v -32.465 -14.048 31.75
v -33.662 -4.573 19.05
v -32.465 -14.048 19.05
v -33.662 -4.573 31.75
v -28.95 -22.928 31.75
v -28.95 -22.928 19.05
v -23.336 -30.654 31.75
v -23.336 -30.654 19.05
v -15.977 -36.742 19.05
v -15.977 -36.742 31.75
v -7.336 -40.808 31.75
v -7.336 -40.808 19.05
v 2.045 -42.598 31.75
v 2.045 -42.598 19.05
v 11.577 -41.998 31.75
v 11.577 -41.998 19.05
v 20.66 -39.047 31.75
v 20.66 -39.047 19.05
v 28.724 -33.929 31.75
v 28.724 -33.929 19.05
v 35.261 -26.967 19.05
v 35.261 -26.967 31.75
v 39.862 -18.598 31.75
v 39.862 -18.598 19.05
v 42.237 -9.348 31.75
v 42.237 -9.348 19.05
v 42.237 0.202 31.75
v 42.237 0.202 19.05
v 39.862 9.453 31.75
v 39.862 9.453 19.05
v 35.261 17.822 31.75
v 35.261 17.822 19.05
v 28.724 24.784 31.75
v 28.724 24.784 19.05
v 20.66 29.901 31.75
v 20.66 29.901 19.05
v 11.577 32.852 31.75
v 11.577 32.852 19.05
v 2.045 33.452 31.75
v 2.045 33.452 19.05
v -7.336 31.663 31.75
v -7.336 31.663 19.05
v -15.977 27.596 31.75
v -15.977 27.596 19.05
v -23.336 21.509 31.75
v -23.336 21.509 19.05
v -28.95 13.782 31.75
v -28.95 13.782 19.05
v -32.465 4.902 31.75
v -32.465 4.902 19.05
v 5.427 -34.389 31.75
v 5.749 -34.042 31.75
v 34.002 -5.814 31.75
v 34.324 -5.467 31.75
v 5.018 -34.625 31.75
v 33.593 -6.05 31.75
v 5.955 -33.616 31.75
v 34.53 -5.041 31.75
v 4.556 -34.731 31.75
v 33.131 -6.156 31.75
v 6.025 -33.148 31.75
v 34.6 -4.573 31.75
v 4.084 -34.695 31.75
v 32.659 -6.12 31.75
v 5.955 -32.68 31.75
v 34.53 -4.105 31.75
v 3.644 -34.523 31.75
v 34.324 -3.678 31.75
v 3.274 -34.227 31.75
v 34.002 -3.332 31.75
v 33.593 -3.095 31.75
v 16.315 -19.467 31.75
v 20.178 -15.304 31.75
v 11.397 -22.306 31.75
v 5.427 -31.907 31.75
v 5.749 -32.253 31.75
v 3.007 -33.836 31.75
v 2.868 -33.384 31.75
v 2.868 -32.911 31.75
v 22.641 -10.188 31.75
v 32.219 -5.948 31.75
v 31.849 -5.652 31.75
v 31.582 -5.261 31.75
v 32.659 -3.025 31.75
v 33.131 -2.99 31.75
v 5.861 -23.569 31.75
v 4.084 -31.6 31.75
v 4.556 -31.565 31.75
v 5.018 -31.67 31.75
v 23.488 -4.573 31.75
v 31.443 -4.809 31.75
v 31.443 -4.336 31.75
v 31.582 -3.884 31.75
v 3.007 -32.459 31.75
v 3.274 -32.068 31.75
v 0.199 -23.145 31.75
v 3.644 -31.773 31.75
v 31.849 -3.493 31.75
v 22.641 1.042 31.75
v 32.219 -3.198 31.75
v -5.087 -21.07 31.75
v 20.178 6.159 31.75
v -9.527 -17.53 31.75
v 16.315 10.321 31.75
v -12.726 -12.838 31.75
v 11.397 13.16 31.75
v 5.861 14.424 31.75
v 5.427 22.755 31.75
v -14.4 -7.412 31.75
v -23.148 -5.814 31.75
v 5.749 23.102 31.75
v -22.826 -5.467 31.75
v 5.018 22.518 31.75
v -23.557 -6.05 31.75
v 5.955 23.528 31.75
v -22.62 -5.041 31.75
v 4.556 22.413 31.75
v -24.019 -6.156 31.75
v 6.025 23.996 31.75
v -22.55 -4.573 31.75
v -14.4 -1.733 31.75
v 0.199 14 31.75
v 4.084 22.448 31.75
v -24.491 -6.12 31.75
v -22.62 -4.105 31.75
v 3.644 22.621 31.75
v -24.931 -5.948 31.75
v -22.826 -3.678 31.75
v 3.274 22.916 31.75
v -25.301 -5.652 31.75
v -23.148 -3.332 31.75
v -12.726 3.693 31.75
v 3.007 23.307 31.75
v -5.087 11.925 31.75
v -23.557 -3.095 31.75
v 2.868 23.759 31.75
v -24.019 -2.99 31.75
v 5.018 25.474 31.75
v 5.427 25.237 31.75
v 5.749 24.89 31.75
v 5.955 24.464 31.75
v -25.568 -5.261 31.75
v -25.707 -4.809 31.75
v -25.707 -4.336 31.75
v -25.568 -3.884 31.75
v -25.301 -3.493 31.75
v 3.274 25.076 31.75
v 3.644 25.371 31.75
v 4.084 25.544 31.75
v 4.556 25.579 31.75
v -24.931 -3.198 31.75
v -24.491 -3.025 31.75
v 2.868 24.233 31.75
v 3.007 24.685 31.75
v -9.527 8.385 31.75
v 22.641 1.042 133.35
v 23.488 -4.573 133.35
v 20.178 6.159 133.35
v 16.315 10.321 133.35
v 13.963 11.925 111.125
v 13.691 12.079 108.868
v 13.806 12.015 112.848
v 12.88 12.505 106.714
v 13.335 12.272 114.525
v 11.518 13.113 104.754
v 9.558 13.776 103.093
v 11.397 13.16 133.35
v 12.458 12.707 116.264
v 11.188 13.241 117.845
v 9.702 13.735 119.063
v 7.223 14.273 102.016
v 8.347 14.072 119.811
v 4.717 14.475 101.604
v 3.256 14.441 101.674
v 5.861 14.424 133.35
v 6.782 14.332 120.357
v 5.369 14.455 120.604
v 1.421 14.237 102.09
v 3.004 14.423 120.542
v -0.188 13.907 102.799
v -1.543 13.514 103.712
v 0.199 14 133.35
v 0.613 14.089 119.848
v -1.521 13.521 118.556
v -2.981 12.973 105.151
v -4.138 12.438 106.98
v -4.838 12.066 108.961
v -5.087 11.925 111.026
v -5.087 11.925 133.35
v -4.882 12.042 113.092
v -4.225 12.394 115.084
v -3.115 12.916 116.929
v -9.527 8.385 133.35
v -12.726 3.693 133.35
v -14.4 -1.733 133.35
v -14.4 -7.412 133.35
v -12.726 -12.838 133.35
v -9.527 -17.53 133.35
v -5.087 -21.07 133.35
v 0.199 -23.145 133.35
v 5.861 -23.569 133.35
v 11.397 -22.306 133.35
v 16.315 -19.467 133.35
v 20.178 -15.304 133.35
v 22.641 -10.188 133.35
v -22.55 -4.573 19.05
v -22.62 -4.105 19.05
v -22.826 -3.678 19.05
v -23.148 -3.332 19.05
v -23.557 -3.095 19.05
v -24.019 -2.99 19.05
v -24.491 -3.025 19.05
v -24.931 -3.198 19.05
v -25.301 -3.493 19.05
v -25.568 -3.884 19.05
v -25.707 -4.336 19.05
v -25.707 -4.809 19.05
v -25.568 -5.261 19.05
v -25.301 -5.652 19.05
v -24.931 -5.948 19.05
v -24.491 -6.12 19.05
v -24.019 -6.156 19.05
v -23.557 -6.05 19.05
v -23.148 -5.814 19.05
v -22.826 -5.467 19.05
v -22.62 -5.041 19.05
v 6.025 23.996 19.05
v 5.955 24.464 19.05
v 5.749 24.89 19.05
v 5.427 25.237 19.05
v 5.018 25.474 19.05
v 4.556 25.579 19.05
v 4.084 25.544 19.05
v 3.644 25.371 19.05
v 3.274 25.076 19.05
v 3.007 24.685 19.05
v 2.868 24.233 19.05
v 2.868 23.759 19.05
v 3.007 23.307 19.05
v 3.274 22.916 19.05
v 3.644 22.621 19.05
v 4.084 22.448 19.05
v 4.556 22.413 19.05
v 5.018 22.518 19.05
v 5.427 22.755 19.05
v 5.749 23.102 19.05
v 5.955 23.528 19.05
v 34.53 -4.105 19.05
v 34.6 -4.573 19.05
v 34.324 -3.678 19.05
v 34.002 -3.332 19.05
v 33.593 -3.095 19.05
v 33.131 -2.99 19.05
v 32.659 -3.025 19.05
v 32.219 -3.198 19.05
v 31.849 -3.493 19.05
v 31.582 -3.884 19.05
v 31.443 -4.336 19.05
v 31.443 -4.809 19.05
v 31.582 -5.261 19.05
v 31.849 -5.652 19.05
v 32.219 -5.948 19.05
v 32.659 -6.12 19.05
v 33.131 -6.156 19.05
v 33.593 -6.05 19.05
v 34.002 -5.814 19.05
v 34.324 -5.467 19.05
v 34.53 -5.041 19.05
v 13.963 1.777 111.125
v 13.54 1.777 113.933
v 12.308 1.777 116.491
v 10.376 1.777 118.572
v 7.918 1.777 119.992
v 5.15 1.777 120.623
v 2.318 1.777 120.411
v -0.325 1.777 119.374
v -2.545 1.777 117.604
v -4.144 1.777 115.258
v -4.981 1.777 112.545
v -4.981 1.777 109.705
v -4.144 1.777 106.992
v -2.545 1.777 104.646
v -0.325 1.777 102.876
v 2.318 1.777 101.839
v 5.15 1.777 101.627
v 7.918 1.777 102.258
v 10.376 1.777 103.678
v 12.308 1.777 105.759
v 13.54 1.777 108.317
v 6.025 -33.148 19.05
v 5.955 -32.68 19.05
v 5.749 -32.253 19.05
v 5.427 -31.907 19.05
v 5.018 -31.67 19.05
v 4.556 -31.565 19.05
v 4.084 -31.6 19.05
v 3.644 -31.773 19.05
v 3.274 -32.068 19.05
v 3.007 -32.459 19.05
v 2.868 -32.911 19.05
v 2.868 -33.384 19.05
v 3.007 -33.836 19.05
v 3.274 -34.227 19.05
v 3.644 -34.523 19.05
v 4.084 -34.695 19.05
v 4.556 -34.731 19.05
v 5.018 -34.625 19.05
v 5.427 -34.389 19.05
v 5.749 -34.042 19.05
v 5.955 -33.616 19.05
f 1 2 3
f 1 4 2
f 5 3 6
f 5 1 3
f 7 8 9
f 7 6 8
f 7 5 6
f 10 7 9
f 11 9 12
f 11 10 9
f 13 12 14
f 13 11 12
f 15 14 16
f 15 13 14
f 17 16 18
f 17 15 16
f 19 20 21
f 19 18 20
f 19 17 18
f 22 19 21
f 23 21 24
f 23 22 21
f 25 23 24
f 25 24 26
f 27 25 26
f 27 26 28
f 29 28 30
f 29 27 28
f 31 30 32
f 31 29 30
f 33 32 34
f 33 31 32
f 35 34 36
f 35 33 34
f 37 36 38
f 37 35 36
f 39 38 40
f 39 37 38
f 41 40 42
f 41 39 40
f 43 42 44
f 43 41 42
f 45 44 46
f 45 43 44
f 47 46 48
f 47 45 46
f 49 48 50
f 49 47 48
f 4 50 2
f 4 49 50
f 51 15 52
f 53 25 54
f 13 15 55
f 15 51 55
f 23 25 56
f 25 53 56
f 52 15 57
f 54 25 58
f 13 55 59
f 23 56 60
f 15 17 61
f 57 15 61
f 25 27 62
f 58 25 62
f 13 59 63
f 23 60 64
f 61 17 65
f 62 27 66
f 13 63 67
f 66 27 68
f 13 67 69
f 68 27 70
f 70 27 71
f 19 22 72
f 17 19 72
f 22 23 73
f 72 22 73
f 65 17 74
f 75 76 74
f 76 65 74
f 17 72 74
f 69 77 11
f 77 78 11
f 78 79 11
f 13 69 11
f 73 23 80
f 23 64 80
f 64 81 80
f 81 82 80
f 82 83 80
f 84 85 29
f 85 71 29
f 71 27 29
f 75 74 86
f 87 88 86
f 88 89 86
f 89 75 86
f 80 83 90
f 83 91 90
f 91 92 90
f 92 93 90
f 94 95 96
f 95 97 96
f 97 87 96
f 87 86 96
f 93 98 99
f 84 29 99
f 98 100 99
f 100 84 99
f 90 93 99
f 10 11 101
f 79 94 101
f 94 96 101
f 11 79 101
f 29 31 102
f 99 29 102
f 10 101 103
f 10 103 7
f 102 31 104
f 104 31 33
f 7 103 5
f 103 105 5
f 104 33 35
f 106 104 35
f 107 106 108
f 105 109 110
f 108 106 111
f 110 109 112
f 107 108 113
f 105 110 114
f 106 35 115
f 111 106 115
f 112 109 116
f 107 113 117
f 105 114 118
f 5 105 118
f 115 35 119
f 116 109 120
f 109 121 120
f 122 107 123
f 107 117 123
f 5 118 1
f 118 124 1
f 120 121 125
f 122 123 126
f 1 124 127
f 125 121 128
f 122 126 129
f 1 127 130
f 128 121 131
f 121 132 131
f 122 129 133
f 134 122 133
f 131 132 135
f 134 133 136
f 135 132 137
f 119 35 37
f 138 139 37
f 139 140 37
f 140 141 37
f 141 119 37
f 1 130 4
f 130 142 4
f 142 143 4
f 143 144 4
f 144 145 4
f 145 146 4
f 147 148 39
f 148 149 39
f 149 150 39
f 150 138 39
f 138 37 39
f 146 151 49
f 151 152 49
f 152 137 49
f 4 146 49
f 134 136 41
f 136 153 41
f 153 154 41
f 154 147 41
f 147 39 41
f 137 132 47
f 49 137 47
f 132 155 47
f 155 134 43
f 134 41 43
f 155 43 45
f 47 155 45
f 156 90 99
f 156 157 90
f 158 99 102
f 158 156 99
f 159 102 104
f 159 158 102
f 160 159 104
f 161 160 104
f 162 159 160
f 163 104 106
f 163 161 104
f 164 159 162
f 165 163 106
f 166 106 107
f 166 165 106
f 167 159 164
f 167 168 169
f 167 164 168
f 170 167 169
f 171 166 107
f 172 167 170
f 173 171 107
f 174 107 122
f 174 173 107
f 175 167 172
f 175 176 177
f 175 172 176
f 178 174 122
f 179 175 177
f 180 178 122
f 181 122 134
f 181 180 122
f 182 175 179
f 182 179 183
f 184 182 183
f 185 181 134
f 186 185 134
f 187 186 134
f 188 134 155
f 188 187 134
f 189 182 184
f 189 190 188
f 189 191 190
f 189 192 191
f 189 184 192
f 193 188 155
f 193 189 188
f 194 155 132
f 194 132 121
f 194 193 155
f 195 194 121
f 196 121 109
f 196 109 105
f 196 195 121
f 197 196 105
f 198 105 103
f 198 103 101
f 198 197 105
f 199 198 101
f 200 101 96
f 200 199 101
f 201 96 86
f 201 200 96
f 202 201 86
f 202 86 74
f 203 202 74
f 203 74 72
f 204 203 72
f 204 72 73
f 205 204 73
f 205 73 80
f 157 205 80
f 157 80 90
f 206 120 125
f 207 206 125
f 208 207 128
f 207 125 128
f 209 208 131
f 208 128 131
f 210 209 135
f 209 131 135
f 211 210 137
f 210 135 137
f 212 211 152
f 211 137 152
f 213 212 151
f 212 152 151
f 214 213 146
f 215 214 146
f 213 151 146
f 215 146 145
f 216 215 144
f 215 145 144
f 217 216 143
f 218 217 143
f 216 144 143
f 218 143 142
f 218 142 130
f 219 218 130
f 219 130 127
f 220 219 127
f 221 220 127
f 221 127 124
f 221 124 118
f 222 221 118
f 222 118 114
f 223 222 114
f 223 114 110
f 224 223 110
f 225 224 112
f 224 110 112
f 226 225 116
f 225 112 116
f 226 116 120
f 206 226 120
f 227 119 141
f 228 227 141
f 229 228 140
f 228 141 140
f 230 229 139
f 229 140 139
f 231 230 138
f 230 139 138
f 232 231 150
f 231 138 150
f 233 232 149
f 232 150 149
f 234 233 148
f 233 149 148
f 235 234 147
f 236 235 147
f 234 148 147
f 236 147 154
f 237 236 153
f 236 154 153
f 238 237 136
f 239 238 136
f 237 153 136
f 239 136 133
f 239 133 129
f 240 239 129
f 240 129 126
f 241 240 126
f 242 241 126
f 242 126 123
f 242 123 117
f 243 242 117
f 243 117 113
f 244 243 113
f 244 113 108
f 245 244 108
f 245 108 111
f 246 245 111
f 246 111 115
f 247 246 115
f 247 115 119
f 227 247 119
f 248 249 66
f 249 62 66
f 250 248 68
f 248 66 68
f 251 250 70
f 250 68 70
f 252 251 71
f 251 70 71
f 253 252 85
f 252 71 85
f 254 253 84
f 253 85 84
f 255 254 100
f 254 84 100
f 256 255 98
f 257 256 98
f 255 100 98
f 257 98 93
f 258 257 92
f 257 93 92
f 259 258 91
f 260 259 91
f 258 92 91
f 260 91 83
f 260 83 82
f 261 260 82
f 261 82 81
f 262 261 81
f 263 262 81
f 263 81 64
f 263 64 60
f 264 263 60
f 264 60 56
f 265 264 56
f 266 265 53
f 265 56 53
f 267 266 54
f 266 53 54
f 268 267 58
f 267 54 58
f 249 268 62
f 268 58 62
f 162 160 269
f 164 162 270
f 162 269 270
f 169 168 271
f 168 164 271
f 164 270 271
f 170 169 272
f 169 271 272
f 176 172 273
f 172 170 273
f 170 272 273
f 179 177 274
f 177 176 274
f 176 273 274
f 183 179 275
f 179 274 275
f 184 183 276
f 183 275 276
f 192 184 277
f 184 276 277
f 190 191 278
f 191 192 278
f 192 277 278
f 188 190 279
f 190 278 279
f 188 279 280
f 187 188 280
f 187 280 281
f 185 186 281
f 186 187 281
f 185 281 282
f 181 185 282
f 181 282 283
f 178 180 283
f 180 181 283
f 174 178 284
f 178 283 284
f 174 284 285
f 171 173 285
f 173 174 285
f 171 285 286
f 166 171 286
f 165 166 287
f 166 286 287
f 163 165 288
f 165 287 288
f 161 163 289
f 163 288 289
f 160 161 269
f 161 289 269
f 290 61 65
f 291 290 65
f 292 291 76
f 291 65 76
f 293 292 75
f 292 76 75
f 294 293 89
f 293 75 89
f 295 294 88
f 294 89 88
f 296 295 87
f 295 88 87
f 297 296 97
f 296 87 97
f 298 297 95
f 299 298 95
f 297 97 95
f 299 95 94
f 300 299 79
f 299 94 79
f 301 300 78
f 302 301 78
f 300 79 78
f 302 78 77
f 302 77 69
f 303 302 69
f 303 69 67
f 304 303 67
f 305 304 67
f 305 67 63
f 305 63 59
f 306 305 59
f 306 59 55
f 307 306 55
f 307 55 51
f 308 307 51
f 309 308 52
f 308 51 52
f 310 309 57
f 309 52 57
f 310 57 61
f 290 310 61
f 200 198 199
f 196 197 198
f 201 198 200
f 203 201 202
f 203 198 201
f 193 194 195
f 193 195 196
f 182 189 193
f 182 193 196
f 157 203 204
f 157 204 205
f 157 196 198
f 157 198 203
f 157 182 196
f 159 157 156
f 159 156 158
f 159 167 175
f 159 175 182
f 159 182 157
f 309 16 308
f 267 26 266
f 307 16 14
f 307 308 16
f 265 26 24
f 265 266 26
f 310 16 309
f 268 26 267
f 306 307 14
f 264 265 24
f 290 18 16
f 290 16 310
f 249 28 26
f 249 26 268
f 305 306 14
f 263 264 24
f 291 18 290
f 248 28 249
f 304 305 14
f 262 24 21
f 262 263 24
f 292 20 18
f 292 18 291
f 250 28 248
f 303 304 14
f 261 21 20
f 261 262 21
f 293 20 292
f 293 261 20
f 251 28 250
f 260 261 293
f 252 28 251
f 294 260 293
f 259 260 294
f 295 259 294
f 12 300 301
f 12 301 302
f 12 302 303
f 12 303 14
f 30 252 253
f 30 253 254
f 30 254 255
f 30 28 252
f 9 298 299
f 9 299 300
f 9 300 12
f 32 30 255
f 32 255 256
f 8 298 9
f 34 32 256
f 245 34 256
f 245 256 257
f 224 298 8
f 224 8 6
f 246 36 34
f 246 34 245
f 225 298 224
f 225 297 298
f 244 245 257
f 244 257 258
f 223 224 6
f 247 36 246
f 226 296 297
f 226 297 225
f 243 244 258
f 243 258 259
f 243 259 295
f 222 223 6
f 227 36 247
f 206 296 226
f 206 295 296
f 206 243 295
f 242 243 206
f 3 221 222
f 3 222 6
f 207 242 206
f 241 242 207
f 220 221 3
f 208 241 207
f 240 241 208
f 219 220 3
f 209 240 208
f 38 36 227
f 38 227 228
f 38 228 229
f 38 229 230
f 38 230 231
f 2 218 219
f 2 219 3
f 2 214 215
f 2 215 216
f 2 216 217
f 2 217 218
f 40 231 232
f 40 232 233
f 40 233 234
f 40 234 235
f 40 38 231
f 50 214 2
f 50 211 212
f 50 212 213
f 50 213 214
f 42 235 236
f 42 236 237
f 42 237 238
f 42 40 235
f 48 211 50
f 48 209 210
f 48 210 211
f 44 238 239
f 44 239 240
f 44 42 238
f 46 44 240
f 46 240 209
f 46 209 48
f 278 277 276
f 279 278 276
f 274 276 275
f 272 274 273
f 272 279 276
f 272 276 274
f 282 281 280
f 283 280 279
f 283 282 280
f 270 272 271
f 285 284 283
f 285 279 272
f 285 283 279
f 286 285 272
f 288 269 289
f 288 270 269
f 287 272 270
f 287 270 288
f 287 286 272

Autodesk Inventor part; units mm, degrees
ref_plane "YZ Plane" through (0, 0, 0) normal (1, 0, 0) x (0, 1, 0)
ref_plane "XZ Plane" through (0, 0, 0) normal (0, 1, 0) x (-1, 0, 0)
ref_plane "Work Plane6" through (0, 0, 31.75) normal (0, 0, 1) x (1, 0, 0)
sketch "Sketch4" plane through (0, 0, 31.75) normal (0, 0, 1) x (1, 0, 0)
  line L0 (17.1377, 8.1273) -> (-8.2623, 8.1273) projected
  line L1 (4.4377, 8.1273) -> (4.4377, -17.2727)
  line L2 (-8.2623, -17.2727) -> (17.1377, -17.2727) projected
  circle A0 centre (4.4377, -4.5727) radius 25.4
  point P0 (0, 0)
  dimension "d11" = 50.8
extrude "Extrusion4" add sketch "Sketch4" along normal blind 101.6
ref_plane "Work Plane2" through (-8.2623, 8.1273, 0) normal (0, 1, 0) x (1, 0, 0)
sketch "Sketch5" plane through (-8.2623, 8.1273, 0) normal (0, 1, 0) x (1, 0, 0)
  line L0 (25.4, 0) -> (0, 0) projected
  line L1 (-12.7, -133.35) -> (38.1, -133.35) projected
  circle A0 centre (12.7, -111.125) radius 9.525
  point P0 (8.2623, 0)
extrude "Extrusion5" cut sketch "Sketch5" along normal blind 101.6
sketch "Sketch6" plane through (4.4377, 8.1273, 111.125) normal (0, 1, 0) x (1, 0, 0)
  circle A0 centre (0, 0) radius 9.525
  point P0 (-4.4377, 111.125)
extrude "Extrusion6" cut sketch "Sketch6" against normal blind 6.35
sketch "Sketch13" plane through (4.4377, -4.5727, 31.75) normal (0, 0, -1) x (-1, 0, 0)
  circle A0 centre (0, 0) radius 38.1
  point P0 (4.4377, 4.5727)
  dimension "d36" = 76.2
extrude "Extrusion11" add sketch "Sketch13" along normal blind 12.7
sketch "Sketch14" plane through (4.4377, -4.5727, 133.35) normal (0, 0, 1) x (1, 0, 0)
  circle A0 centre (0, 0) radius 19.05
  circle A1 centre (0, 0) radius 25.4
  point P0 (-4.4377, 4.5727)
  dimension "d39" = 38.1
extrude "Extrusion12" cut sketch "Sketch14" against normal blind 101.6
sketch "Sketch15" plane through (4.4377, -4.5727, 31.75) normal (0, 0, 1) x (1, 0, 0)
  circle A0 centre (0, 0) radius 19.05 projected
  line L0 (-19.05, 0) -> (-38.1, 0)
  circle A1 centre (0, 0) radius 38.1 projected
  line L1 (0, 38.1) -> (0, 19.0375)
  line L2 (19.05, 0) -> (38.1, 0)
  line L3 (0, -19.05) -> (0, -38.1)
  circle A2 centre (-28.575, 0) radius 1.5875
  circle A3 centre (28.575, 0) radius 1.5875
  circle A4 centre (0, 28.5687) radius 1.5875
  circle A5 centre (0, -28.575) radius 1.5875
  point P0 (-4.4377, 4.5727)
  dimension "d42" = 3.175
  dimension "d43" = 3.175
  dimension "d44" = 3.175
  dimension "d45" = 3.175
extrude "Extrusion13" cut sketch "Sketch15" against normal blind 101.6 contours A2 L0 | L0 A2 | A5 L3 | L3 A5 | A4 L1 | L1 A4 | A3 L2 | L2 A3
properties part number "CrankP1_SBail"
